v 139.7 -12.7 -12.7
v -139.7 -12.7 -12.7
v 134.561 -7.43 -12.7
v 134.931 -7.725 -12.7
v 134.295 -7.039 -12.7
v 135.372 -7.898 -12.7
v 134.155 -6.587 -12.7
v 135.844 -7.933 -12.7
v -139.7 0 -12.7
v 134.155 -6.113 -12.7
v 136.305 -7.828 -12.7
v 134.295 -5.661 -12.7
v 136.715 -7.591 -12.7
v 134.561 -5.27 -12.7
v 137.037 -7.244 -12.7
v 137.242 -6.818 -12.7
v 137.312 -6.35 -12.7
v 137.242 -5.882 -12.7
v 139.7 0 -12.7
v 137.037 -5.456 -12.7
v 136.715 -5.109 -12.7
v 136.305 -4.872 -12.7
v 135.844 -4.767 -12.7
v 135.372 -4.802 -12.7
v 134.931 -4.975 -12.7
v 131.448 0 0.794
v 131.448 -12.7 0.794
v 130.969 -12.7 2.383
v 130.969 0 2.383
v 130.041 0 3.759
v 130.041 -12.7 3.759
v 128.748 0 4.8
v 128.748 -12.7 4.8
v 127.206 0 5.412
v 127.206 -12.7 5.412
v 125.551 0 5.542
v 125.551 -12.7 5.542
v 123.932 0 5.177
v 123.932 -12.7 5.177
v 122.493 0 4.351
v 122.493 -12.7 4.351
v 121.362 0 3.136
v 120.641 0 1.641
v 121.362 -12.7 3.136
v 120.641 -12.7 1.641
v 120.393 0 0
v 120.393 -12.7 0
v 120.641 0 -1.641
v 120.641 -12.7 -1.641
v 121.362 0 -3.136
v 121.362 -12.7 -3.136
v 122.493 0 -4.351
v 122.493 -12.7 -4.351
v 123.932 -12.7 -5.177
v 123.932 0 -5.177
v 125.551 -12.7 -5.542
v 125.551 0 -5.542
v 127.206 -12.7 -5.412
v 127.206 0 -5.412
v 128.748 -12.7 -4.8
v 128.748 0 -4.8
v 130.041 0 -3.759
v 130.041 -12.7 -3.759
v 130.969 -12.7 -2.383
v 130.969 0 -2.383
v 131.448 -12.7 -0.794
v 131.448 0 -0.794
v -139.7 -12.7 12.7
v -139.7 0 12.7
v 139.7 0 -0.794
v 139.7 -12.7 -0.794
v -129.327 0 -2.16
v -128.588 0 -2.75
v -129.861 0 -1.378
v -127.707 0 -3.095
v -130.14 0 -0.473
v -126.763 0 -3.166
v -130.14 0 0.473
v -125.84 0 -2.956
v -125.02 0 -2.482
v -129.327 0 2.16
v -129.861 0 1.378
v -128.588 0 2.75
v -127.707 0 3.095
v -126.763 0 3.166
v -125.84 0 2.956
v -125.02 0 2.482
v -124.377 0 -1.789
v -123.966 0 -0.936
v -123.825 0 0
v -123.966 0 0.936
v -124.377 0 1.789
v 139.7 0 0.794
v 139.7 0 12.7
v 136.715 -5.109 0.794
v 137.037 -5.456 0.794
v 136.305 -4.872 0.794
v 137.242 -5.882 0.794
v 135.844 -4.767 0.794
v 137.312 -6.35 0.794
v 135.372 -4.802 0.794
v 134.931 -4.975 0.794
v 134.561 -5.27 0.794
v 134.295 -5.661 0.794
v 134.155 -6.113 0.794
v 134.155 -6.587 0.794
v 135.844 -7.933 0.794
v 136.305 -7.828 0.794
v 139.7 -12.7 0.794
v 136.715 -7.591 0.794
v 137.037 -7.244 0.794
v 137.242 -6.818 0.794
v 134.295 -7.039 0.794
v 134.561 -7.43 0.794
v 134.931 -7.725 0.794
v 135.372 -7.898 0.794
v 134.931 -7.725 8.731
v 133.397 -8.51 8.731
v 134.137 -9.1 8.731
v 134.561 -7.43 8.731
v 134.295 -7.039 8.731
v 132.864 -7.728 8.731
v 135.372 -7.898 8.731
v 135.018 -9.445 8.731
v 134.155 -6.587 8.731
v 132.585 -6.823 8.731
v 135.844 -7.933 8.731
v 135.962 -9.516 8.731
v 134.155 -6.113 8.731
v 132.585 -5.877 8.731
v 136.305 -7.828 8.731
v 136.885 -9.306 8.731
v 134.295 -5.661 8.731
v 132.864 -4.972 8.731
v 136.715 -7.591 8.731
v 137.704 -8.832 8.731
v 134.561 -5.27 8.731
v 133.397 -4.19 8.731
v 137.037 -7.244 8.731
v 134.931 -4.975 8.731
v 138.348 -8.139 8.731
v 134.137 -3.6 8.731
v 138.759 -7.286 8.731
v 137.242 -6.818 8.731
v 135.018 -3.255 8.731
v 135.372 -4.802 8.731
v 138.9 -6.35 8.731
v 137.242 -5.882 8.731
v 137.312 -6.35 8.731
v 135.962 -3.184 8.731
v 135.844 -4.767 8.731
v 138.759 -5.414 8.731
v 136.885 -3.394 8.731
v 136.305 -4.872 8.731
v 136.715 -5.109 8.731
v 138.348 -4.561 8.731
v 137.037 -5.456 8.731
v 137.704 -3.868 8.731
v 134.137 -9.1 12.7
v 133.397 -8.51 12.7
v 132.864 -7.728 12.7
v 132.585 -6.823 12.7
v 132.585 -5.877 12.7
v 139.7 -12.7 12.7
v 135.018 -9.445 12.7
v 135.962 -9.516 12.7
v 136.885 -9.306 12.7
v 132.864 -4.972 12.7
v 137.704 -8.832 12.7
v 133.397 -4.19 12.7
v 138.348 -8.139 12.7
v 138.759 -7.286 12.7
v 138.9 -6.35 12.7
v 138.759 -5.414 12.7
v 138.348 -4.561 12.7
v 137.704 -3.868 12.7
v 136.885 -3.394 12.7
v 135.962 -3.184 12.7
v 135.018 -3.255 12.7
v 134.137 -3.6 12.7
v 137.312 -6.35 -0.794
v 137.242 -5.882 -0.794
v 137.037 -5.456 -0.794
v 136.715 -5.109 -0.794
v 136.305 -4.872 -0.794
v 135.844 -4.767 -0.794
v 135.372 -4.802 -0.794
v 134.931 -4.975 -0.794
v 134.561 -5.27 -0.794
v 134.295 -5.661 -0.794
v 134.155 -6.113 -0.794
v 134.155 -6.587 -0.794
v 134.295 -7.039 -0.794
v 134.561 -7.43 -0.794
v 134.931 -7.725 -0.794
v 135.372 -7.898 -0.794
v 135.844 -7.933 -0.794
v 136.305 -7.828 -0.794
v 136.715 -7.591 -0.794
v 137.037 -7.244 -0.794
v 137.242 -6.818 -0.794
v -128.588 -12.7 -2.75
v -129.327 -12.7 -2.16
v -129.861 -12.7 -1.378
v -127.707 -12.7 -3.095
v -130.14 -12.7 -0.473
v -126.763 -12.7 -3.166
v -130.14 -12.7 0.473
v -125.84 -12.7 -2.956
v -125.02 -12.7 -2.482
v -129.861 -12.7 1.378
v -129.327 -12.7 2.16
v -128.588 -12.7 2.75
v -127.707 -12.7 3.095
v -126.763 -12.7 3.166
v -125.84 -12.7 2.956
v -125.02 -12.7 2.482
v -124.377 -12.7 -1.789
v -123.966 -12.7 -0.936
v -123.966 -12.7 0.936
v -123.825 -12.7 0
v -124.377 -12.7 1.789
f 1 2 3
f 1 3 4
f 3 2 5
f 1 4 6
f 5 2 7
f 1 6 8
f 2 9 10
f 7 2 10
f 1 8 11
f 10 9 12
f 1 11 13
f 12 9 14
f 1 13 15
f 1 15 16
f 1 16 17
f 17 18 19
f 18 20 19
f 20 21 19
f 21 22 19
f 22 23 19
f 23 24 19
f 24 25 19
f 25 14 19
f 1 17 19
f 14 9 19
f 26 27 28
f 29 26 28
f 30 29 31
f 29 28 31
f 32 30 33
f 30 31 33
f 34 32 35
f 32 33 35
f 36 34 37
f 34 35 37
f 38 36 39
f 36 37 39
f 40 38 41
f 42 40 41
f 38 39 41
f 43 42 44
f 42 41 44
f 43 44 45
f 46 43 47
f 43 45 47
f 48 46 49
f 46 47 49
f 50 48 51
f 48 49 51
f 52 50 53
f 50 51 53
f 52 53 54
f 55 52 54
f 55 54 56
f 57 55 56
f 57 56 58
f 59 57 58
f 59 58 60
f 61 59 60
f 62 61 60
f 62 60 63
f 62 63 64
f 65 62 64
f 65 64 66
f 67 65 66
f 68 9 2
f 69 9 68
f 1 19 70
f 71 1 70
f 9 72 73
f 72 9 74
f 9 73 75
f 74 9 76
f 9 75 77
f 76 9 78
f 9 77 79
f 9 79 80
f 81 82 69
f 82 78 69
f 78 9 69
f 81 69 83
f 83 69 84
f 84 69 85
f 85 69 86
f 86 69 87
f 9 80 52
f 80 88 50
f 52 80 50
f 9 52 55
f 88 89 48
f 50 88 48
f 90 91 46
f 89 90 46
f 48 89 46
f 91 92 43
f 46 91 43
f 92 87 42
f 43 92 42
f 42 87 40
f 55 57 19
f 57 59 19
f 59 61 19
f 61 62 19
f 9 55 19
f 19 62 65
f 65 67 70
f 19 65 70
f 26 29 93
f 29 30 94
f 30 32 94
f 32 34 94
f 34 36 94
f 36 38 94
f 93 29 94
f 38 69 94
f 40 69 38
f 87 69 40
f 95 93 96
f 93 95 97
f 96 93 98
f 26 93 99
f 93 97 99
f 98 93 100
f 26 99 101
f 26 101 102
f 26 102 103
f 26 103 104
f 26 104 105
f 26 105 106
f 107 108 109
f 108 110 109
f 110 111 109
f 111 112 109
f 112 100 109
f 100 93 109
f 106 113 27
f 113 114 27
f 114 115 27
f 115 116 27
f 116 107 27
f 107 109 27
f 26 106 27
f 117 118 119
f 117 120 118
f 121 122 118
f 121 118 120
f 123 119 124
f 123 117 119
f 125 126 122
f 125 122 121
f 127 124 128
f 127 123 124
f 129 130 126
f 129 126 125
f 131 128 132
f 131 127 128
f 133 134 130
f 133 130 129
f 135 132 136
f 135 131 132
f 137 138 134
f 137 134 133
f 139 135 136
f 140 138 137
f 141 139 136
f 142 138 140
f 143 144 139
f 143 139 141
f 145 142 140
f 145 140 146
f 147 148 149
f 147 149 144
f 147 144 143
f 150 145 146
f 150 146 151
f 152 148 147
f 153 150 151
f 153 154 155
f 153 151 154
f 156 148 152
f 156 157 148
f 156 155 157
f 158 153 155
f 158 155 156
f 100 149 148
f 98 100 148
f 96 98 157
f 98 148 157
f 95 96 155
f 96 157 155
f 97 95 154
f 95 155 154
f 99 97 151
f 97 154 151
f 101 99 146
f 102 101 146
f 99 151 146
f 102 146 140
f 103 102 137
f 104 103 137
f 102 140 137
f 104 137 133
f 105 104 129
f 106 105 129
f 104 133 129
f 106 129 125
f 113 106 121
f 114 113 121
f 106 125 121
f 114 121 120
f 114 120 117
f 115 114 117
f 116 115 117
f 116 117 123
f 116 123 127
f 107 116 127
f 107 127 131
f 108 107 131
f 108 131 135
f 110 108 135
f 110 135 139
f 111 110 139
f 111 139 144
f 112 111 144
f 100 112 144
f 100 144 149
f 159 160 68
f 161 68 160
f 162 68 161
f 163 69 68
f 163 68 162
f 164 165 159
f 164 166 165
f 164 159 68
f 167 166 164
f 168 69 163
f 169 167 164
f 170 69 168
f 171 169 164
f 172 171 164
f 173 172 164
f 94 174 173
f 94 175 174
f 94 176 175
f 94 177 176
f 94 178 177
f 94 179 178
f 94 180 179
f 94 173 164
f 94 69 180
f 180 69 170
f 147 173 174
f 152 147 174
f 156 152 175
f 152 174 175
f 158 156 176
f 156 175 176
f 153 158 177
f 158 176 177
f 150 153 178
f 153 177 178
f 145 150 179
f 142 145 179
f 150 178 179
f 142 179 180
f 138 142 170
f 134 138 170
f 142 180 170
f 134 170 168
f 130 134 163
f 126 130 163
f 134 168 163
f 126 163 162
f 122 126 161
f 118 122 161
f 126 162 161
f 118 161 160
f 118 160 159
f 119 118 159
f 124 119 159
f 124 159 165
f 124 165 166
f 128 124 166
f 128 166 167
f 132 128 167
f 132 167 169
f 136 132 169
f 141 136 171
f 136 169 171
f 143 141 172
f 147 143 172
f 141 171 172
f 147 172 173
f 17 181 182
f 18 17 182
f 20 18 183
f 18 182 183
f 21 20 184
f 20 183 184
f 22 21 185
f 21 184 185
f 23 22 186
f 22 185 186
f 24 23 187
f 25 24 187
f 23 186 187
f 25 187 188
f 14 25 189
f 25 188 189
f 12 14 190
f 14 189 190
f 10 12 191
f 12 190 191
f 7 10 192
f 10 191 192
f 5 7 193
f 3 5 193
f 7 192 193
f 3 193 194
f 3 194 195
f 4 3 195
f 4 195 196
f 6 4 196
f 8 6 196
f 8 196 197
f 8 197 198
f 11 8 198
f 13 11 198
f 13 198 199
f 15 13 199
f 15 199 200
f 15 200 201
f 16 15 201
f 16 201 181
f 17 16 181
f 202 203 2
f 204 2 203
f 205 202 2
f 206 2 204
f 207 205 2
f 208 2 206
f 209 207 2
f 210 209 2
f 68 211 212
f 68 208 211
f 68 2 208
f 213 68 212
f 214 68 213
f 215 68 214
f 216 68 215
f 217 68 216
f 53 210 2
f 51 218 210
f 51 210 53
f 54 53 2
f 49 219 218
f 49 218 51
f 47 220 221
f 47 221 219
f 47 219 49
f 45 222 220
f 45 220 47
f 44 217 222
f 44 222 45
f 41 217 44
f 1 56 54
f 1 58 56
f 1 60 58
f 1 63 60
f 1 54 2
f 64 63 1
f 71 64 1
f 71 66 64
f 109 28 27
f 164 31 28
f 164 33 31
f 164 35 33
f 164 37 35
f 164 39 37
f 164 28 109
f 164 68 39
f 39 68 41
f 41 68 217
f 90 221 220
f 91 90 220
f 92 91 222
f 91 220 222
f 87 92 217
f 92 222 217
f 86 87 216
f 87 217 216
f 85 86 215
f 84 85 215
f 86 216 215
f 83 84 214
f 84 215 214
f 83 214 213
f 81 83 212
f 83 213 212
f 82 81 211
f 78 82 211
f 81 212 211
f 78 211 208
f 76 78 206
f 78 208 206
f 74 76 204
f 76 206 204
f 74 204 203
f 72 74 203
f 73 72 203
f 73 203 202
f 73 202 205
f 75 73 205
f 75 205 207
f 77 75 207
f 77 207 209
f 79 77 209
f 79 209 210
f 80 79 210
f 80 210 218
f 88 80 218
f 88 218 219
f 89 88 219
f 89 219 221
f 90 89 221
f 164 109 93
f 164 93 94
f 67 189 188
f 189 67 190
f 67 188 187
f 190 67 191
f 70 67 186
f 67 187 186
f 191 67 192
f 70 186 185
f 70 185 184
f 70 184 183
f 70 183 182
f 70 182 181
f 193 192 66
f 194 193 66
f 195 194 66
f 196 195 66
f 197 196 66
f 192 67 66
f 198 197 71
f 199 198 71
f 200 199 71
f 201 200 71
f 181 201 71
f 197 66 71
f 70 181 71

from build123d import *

# Parameters (mm, degrees)
F0_W     = 279.4
F0_H     = 25.4
F1_DEPTH = 12.7
F3_R     = 1.5875
F4_DEPTH = 25.401
F5_R     = 3.175
F6_DEPTH = 3.96875
F7_DEPTH = 12.701


with BuildPart() as f1:
    # F0 (on Front) → F1 (new body)
    with BuildSketch(Plane.XZ):
        Rectangle(F0_W, F0_H)
    extrude(amount=F1_DEPTH)

    # F3 (on face) → F4 (cut, through all)
    with BuildSketch(Plane.XY.offset(12.7)):
        with Locations((135.7249, -6.35)):
            Circle(F3_R)
    extrude(amount=-F4_DEPTH, mode=Mode.SUBTRACT)

    # F5 (on face) → F6 (cut)
    with BuildSketch(Plane.XY.offset(12.7)):
        with Locations((135.7249, -6.35)):
            Circle(F5_R)
    extrude(amount=-F6_DEPTH, mode=Mode.SUBTRACT)

    # F2 (on face) → F7 (cut, through all)
    with BuildSketch(Plane.XZ.offset(12.7)):
        with BuildLine():
            ThreePointArc((-130.175, 0), (-127, -3.175), (-123.825, 0))
            ThreePointArc((-123.825, 0), (-127, 3.175), (-130.175, 0))
        make_face()
        with BuildLine():
            Line((139.7, 0.79375), (131.448406, 0.79375))
            ThreePointArc((131.448406, 0.79375), (120.392894, 0), (131.448406, -0.79375))
            Line((131.448406, -0.79375), (139.7, -0.79375))
            Line((139.7, -0.79375), (139.7, 0.79375))
        make_face()
    extrude(amount=-F7_DEPTH, mode=Mode.SUBTRACT)


solid = f1.part
